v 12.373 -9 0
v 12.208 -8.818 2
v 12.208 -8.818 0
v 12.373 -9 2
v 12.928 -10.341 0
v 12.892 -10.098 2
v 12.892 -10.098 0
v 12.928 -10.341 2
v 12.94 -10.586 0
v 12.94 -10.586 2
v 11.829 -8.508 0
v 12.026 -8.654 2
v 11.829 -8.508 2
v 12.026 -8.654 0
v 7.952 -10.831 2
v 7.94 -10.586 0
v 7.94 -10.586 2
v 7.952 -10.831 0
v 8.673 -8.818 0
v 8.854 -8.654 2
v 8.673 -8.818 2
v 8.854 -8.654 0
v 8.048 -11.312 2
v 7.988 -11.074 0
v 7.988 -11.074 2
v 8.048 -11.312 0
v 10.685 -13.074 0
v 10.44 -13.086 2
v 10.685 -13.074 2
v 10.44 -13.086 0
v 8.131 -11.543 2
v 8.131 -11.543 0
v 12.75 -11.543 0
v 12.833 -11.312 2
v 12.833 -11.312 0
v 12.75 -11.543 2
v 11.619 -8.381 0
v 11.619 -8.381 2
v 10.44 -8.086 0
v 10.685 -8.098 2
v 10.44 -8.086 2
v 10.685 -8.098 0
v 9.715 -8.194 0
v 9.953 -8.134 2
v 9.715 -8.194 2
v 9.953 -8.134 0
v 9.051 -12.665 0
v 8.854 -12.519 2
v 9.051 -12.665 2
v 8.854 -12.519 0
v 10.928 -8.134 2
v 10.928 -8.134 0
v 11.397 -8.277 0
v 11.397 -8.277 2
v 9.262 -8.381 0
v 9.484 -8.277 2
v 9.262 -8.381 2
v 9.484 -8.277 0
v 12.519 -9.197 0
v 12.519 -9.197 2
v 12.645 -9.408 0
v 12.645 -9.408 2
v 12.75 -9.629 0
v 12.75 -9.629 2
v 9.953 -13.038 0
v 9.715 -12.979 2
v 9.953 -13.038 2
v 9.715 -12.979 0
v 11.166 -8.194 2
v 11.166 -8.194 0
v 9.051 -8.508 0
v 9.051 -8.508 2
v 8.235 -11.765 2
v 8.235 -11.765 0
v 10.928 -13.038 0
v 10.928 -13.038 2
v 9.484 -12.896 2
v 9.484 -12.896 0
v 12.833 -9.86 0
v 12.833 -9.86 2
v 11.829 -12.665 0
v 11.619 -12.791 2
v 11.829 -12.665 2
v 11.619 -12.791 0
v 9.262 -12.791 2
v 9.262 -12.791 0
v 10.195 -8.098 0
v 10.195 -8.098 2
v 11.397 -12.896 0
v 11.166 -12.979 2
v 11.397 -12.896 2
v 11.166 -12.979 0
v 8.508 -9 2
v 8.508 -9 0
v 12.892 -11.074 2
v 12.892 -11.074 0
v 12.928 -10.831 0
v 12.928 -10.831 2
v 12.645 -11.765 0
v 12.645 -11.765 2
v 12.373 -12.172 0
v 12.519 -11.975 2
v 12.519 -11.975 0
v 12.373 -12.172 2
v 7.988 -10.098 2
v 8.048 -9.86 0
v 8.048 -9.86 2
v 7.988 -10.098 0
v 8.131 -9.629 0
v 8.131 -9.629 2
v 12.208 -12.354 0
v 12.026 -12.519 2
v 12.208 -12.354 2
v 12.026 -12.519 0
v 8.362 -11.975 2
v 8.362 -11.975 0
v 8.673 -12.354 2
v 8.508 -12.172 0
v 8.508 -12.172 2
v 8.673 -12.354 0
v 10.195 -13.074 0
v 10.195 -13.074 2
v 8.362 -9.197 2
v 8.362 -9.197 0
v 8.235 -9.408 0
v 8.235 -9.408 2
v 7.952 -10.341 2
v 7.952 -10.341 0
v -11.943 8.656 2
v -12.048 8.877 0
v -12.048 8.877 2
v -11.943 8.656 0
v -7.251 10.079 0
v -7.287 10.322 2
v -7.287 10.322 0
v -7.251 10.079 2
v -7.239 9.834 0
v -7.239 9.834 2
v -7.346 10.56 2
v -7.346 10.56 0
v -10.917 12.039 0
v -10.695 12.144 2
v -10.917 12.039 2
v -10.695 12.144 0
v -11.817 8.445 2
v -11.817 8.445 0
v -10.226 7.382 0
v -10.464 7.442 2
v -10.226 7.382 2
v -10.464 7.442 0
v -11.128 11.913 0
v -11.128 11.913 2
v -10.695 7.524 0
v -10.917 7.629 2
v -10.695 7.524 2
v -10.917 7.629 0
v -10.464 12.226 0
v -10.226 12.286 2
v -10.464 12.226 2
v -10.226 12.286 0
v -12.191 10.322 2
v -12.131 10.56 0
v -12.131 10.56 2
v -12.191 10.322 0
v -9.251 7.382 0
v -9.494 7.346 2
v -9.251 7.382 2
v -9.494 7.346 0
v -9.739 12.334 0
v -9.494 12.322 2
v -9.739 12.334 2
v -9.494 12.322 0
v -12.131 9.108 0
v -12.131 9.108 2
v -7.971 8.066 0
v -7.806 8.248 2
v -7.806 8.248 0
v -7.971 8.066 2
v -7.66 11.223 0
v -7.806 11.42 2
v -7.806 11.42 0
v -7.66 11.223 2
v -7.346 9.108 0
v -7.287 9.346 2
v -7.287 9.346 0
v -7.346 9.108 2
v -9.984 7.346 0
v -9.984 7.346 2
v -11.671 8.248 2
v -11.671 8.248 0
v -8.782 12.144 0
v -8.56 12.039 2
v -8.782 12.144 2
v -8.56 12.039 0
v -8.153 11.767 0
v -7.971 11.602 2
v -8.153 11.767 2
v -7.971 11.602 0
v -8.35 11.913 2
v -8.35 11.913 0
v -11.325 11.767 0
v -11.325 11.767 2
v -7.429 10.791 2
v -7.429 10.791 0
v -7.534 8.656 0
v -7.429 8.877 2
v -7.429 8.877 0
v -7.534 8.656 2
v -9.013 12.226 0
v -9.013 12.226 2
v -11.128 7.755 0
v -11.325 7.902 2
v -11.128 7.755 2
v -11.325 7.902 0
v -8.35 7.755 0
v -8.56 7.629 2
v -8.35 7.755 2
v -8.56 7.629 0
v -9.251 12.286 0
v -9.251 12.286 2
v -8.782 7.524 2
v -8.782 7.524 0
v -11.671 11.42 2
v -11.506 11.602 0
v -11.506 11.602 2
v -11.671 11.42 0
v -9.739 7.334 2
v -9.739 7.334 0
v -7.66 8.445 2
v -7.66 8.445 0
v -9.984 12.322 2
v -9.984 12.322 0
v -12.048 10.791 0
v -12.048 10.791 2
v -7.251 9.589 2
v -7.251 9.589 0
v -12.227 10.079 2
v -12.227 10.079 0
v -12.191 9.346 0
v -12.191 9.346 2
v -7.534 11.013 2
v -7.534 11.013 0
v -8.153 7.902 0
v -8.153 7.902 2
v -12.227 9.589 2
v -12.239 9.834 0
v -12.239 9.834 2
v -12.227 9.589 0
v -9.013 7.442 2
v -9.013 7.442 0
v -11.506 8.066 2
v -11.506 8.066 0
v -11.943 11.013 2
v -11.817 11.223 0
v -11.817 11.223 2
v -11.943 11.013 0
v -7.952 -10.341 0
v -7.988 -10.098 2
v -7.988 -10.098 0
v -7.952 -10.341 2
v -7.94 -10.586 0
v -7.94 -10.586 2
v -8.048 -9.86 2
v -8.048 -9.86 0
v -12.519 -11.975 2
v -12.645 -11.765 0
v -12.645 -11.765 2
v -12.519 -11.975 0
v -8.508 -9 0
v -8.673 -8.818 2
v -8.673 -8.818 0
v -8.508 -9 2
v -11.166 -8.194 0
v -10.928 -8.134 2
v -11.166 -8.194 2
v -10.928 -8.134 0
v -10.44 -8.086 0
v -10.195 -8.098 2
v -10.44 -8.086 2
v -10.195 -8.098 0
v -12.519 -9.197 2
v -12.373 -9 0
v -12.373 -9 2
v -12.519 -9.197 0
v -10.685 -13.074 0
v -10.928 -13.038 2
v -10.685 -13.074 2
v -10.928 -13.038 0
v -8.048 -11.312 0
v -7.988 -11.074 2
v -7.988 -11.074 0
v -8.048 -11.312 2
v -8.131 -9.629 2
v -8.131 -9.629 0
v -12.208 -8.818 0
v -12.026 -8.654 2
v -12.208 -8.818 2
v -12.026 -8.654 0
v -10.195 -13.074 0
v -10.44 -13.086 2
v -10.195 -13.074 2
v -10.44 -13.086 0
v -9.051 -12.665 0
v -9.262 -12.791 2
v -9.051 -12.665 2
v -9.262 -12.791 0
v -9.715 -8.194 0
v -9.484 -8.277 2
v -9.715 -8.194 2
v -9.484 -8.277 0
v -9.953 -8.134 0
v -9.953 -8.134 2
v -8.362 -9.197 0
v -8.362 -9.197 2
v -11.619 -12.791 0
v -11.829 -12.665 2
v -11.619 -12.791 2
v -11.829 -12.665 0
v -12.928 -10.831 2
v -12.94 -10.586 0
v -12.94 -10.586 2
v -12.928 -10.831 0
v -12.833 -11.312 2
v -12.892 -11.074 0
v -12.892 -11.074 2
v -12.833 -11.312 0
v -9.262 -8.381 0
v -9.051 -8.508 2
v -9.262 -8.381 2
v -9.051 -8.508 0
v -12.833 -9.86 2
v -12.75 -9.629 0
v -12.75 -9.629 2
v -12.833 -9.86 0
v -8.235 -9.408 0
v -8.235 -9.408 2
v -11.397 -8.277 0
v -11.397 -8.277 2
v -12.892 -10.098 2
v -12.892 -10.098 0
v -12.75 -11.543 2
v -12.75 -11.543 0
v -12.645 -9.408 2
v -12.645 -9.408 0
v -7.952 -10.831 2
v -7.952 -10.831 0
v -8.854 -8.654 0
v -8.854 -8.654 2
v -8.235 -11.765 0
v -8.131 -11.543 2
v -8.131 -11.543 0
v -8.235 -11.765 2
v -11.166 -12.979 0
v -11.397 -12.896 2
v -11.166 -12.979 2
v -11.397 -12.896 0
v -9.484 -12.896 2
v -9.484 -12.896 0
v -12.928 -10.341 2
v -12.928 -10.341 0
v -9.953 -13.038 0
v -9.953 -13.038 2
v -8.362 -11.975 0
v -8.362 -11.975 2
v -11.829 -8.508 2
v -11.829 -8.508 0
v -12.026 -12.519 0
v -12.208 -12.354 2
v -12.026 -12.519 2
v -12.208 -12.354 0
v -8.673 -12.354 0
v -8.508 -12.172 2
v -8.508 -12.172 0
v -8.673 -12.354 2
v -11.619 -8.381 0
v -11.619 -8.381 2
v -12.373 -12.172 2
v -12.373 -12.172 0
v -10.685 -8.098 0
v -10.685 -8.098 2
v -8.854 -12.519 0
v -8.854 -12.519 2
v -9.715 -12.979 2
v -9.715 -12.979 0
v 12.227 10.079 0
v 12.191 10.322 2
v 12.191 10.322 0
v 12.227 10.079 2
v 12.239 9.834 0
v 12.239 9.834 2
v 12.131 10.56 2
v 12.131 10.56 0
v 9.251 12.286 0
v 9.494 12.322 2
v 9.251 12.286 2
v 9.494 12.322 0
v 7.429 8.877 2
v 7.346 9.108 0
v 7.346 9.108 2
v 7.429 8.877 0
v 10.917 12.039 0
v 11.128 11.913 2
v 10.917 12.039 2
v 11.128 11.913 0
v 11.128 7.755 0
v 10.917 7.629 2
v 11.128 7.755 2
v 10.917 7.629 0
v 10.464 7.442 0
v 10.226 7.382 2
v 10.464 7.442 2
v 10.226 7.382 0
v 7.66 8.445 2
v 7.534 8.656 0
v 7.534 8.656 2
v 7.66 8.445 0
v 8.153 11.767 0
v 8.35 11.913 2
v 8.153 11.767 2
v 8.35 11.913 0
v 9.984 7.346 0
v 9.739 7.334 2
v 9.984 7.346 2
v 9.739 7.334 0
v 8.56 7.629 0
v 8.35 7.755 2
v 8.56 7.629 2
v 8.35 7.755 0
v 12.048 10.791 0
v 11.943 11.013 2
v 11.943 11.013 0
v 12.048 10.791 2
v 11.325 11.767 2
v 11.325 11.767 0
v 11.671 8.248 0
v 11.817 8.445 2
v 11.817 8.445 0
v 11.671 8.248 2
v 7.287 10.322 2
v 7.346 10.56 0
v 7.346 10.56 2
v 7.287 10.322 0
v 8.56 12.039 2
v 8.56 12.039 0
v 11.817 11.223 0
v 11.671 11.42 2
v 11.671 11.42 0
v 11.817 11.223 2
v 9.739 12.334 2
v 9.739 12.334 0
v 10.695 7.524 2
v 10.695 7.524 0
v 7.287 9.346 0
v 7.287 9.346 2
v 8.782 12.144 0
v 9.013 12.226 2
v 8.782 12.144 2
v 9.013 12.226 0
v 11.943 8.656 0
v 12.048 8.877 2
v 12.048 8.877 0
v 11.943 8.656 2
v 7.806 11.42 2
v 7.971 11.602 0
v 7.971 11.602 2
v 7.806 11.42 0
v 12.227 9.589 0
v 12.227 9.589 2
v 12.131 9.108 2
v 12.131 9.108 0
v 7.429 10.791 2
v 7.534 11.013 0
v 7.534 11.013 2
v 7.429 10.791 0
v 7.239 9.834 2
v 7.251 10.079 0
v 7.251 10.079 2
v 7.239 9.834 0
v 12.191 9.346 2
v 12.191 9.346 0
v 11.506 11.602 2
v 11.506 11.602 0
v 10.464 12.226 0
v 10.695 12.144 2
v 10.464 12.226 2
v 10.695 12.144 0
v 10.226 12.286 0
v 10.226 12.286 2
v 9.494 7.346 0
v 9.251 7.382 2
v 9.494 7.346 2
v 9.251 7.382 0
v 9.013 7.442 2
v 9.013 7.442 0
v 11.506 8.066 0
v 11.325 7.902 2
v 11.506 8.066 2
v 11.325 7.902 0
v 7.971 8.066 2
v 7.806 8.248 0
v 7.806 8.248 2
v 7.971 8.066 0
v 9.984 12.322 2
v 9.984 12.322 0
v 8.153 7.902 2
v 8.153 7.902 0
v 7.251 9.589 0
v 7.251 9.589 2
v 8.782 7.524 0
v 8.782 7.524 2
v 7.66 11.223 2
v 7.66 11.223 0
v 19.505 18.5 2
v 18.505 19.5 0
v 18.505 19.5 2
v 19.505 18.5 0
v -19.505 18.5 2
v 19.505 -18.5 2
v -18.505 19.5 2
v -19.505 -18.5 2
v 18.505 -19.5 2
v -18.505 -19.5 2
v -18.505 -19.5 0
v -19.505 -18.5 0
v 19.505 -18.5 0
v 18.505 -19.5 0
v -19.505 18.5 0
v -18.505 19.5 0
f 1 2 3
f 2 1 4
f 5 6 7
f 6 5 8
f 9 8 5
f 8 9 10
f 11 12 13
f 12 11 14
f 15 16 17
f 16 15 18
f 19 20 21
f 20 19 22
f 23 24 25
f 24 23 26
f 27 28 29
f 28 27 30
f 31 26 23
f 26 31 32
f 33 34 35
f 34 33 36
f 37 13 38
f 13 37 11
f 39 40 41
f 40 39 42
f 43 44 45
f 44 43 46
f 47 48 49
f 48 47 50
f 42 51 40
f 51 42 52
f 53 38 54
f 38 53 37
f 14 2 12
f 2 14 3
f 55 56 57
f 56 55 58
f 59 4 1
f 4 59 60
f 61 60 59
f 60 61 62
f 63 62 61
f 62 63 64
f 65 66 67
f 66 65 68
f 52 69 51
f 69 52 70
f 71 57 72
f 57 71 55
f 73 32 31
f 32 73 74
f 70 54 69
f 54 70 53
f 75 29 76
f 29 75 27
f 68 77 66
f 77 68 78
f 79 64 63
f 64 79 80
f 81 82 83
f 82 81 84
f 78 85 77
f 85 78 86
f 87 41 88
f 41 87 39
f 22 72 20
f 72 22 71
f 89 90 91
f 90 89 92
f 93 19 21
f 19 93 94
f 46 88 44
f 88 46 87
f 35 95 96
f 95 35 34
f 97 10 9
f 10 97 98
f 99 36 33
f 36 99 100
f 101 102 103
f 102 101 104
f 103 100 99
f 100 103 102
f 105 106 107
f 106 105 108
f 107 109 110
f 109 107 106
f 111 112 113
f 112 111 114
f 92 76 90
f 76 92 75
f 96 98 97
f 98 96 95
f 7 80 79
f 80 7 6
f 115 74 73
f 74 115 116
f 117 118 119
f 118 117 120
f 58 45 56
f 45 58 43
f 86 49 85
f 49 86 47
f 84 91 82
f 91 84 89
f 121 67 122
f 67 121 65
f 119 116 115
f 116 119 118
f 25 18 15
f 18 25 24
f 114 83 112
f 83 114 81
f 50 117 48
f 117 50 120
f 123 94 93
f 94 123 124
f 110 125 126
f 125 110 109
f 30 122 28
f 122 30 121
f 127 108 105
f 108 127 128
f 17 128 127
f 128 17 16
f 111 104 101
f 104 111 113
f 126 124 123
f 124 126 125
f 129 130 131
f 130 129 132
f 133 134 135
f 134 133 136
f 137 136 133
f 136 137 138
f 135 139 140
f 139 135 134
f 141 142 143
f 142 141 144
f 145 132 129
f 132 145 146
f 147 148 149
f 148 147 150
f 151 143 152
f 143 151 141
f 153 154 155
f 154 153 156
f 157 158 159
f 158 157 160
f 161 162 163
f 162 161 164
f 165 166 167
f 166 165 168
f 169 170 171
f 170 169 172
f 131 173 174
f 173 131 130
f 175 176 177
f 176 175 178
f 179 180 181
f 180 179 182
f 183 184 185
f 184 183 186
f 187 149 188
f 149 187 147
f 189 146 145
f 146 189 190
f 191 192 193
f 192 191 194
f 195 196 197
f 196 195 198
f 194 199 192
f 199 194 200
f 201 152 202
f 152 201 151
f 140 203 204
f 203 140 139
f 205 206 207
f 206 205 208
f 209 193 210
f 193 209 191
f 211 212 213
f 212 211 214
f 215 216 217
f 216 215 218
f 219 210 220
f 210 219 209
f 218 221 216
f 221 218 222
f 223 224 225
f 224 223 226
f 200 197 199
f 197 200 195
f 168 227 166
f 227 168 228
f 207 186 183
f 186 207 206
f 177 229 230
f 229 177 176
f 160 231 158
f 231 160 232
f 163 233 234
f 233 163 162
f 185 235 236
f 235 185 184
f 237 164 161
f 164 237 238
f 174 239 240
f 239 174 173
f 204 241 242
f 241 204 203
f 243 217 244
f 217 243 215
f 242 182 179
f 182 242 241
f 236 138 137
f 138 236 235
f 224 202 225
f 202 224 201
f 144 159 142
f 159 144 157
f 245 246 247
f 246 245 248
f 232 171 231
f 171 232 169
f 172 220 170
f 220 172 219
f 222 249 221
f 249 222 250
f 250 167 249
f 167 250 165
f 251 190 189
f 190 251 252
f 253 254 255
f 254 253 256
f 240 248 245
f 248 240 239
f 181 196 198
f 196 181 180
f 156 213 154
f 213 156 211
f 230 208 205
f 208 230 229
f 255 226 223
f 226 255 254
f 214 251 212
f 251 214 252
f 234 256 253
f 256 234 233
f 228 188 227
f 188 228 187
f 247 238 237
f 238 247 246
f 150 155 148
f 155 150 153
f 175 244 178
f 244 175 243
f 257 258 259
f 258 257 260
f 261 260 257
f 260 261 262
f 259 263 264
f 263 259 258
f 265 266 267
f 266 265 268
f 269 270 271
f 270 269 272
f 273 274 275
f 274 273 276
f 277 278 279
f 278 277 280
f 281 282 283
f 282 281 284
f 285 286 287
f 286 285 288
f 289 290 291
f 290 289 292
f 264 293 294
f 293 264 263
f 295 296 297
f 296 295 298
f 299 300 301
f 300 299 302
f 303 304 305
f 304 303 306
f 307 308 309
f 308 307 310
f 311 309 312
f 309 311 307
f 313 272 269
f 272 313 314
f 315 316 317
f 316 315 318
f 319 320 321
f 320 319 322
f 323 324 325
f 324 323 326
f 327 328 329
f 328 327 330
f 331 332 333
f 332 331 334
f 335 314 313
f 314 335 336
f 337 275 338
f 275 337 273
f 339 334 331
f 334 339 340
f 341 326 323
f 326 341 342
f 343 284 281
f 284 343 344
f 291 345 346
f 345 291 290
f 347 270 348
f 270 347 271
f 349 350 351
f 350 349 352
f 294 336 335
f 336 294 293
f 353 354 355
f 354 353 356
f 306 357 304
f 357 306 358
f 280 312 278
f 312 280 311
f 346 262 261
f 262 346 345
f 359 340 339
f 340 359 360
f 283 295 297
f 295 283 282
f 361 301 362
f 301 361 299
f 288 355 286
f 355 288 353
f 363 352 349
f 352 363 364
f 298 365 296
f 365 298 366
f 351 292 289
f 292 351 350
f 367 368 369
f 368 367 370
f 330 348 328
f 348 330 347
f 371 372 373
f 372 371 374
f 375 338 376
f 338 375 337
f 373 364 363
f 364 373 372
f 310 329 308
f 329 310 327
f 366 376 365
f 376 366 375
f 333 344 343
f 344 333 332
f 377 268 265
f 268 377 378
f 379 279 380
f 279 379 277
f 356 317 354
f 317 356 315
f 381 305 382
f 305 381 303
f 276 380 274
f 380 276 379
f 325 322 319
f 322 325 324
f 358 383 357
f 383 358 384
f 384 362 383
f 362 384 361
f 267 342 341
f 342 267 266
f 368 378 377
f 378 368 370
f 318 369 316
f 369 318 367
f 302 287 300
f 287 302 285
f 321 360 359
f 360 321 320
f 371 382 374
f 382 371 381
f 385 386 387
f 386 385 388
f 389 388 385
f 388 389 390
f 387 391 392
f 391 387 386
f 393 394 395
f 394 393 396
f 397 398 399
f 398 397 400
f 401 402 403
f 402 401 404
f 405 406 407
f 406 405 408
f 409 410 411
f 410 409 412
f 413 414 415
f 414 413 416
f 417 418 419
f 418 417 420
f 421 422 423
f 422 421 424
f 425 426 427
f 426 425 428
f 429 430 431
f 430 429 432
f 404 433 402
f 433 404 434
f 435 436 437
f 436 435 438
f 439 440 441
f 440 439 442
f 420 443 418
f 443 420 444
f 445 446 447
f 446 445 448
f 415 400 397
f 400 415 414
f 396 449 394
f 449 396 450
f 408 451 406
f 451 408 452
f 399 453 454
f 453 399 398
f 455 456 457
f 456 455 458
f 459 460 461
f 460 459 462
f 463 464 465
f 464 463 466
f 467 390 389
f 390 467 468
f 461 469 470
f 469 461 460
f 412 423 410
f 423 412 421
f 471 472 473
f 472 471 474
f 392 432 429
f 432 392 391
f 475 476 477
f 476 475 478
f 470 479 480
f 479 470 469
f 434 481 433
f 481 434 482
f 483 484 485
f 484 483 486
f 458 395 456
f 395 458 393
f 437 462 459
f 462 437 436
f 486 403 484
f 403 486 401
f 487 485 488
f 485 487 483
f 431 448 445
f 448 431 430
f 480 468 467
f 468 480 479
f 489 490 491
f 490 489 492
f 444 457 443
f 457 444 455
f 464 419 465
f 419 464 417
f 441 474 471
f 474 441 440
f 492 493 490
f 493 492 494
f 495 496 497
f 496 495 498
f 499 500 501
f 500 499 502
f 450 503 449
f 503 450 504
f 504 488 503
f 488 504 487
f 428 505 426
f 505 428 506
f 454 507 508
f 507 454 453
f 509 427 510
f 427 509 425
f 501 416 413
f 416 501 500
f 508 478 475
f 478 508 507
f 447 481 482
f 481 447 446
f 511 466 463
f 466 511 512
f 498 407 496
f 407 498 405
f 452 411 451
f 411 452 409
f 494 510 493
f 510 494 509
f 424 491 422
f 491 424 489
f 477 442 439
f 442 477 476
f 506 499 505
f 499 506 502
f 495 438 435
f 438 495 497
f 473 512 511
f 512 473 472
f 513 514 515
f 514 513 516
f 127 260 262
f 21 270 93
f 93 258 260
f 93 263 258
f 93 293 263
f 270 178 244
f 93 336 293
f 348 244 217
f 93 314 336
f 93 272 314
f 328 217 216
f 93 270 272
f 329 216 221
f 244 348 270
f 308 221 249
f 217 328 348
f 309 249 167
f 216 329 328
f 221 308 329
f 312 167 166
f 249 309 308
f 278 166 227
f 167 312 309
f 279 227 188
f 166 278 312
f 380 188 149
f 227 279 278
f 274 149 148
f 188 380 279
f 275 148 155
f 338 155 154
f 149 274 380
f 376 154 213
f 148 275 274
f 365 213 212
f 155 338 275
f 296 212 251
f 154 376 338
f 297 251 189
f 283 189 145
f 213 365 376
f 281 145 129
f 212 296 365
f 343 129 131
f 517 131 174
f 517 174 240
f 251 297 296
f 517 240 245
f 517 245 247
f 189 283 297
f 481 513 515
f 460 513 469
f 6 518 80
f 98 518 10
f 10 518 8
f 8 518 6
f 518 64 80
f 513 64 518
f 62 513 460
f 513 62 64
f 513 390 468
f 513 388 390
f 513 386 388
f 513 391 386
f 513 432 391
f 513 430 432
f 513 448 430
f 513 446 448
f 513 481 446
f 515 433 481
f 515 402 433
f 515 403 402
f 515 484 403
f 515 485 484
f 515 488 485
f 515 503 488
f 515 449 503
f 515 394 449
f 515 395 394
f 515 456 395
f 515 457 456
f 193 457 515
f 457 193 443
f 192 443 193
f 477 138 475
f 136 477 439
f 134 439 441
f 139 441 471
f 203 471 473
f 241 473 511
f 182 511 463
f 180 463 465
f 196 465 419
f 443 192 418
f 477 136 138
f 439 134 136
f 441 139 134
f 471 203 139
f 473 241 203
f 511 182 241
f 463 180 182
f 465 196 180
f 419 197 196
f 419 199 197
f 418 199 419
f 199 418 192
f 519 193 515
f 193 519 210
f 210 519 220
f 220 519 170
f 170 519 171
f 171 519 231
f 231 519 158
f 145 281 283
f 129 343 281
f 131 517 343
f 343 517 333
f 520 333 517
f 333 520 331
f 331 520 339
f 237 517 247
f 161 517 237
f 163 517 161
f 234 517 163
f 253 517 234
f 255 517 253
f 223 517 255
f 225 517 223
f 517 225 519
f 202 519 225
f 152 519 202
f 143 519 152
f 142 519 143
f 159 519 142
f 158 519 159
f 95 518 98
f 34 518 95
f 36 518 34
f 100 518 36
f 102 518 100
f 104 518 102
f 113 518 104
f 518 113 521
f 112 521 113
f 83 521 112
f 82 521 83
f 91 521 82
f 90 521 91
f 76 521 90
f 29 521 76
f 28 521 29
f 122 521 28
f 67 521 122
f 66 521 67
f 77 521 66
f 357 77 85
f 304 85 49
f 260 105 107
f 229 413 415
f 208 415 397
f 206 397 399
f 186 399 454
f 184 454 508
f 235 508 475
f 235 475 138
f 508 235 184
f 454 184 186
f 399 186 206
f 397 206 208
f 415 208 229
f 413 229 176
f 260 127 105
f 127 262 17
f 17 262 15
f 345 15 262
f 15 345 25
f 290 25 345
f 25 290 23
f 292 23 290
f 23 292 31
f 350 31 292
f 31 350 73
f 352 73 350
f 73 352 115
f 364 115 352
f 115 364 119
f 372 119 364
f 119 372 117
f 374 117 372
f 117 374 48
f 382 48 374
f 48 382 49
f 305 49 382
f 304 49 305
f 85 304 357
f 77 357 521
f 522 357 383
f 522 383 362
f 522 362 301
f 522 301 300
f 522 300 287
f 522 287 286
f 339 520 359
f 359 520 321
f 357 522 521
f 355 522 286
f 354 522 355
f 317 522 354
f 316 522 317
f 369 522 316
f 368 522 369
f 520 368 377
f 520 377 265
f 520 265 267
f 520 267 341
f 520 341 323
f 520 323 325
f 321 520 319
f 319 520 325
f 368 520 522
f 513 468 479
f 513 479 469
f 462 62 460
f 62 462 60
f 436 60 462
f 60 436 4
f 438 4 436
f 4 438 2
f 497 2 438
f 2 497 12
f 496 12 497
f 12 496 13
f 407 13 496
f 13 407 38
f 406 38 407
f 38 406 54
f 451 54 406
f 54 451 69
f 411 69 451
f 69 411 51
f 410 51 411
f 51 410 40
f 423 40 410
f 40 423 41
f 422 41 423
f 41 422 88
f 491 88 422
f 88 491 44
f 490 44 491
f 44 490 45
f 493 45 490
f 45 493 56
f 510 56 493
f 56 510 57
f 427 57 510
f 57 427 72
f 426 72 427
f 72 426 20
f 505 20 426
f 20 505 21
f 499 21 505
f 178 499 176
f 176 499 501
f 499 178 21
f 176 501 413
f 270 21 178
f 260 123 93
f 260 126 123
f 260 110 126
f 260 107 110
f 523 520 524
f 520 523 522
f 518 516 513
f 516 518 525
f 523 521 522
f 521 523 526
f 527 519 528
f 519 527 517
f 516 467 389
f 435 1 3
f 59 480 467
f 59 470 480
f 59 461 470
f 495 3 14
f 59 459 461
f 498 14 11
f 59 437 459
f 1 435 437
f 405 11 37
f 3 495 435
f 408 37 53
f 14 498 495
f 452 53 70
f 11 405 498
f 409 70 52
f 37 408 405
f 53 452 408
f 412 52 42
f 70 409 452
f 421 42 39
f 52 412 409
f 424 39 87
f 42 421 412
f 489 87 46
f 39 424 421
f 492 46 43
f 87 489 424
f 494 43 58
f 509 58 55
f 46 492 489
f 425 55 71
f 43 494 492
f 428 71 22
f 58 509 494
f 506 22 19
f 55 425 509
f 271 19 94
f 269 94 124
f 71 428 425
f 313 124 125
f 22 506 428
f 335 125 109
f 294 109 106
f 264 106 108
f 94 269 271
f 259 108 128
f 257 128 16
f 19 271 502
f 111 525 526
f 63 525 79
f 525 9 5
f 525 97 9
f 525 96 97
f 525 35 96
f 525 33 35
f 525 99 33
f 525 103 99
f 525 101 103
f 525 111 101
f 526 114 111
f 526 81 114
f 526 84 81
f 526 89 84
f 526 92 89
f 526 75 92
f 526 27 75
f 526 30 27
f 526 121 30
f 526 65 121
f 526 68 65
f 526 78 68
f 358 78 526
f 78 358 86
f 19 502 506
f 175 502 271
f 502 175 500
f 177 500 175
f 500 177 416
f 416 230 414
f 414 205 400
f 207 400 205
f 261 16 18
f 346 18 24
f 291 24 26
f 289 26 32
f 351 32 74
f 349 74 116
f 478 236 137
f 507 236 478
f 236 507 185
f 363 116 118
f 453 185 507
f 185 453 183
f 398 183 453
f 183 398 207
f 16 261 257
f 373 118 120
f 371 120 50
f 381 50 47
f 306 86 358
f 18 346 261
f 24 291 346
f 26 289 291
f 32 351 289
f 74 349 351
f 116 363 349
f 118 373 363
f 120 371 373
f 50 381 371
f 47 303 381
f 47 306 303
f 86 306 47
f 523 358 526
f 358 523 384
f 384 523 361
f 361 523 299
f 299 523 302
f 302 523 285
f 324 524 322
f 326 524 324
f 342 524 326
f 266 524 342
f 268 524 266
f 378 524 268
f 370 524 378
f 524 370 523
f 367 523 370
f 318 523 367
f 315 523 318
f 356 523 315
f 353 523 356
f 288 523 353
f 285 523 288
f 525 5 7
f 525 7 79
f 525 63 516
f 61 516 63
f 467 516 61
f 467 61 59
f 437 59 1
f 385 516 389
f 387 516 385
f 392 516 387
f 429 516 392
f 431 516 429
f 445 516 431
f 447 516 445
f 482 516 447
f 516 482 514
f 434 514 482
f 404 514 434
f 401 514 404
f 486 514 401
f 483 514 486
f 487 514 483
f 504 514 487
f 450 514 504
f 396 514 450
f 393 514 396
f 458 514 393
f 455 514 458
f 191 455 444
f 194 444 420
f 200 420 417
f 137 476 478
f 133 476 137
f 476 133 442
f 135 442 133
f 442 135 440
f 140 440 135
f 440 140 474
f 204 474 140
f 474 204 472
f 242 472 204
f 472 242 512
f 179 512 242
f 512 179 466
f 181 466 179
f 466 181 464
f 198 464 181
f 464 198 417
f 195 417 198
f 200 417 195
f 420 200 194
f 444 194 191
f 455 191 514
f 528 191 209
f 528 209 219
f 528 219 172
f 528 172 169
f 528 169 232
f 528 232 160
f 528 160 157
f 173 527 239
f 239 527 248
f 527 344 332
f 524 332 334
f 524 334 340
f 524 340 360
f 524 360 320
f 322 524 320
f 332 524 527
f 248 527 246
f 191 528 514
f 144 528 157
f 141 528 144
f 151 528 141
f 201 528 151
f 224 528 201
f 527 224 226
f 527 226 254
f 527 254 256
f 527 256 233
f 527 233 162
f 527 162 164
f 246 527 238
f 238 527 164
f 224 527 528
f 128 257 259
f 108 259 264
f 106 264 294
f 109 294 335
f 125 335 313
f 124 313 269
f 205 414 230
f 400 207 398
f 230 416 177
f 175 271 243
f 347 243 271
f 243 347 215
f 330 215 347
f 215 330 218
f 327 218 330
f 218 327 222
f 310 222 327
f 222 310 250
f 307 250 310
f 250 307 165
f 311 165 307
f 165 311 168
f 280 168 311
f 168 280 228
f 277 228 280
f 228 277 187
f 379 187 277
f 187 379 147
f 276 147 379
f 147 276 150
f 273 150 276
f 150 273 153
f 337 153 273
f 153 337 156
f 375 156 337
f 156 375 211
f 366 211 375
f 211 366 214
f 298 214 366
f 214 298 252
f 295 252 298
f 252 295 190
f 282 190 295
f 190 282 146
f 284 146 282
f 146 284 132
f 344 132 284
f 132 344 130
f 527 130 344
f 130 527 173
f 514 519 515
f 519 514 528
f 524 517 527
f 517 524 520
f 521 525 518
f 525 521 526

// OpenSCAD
// Parametric CR6 front base plate rebuilt in editable OpenSCAD.
// Dropdown-only options for hole pattern and plate thickness.

/* [Plate Options] */
plate_hole_mode = 2; // [0:Left diagonal, 1:Right diagonal, 2:All four holes]
base_plate_thickness = 2.0; // [1.5:1.5mm, 2.0:2.0mm, 2.5:2.5mm, 3.0:3.0mm, 4.0:4.0mm]

plate_size = [39.01, 39.0];
plate_corner_radius = 1.0;
mounting_hole_diameter = 5.0;

left_diagonal_holes = [[10.440278, -10.586206], [-9.738590, 9.834044]];
right_diagonal_holes = [[-10.440278, -10.586206], [9.738590, 9.834044]];
all_holes = concat(left_diagonal_holes, right_diagonal_holes);

function selected_holes(mode) = mode == 2 ? all_holes : mode == 1 ? right_diagonal_holes : left_diagonal_holes;

module rounded_square(size, radius) {
    offset(r = radius)
        square([size[0] - 2 * radius, size[1] - 2 * radius], center = true);
}

module front_plate_base_v1(hole_mode = plate_hole_mode, thickness = base_plate_thickness) {
    difference() {
        linear_extrude(height = thickness)
            rounded_square(plate_size, plate_corner_radius);

        for (hole = selected_holes(hole_mode)) {
            translate([hole[0], hole[1], -0.1])
                cylinder(d = mounting_hole_diameter, h = thickness + 0.2, $fn = 64);
        }
    }
}

front_plate_base_v1();
